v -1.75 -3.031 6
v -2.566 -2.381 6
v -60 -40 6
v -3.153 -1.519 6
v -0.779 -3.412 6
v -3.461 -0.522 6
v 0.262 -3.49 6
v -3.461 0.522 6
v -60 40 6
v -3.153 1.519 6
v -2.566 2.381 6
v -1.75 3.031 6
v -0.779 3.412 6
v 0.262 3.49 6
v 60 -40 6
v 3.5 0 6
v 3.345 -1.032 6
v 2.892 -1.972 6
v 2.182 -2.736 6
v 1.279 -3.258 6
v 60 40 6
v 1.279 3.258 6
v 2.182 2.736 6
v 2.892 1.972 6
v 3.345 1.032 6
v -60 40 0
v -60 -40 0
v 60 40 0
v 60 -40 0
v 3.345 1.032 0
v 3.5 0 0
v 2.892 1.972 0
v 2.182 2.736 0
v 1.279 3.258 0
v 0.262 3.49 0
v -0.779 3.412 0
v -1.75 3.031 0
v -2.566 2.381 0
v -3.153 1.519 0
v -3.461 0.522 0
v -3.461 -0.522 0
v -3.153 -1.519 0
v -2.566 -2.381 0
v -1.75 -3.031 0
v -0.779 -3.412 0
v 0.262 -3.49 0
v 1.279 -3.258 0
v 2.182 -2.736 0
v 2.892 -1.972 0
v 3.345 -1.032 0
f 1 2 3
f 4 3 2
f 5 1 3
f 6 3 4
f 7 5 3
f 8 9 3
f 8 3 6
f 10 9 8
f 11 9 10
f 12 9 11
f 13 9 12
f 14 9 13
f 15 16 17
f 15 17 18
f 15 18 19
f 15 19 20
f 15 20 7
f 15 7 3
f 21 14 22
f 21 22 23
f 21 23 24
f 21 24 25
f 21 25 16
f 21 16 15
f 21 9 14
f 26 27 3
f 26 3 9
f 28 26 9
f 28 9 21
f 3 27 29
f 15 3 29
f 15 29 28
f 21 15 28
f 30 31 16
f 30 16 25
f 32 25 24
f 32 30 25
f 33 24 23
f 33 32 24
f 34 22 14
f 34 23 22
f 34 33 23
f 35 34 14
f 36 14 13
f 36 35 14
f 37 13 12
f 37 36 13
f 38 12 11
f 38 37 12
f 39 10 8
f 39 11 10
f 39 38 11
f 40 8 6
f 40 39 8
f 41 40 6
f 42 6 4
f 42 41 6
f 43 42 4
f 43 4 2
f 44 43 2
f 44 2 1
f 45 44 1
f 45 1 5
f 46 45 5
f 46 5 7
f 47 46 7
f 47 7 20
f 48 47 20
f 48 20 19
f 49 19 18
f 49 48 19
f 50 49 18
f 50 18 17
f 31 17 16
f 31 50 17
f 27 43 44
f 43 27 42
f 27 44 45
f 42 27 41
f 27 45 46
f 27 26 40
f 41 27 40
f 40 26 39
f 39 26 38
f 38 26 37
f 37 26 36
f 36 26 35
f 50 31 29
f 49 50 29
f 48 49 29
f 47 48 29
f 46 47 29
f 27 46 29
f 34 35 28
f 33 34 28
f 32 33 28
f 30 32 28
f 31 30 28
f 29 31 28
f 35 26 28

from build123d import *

# Parameters (mm, degrees)
SKETCH1_W               = 120
SKETCH1_H               = 80
BOSS_EXTRUDE1_DEPTH     = 6
CUT_EXTRUDE3_DEPTH      = 73.360210061
CUT_EXTRUDE3_DEPTH_BACK = 73.360210061
SKETCH2_R               = 3.5


with BuildPart() as part:
    # Sketch1 → Boss-Extrude1 (new body)
    with BuildSketch(Plane.XY):
        Rectangle(SKETCH1_W, SKETCH1_H)
    extrude(amount=BOSS_EXTRUDE1_DEPTH)

    # Sketch2 → Cut-Extrude3 (cut, two sides: drawn at the far end of the back side and taken through both)
    with BuildSketch(Plane.XY.offset(-CUT_EXTRUDE3_DEPTH_BACK)):
        Circle(SKETCH2_R)
    extrude(amount=CUT_EXTRUDE3_DEPTH + CUT_EXTRUDE3_DEPTH_BACK, mode=Mode.SUBTRACT)


solid = part.part
